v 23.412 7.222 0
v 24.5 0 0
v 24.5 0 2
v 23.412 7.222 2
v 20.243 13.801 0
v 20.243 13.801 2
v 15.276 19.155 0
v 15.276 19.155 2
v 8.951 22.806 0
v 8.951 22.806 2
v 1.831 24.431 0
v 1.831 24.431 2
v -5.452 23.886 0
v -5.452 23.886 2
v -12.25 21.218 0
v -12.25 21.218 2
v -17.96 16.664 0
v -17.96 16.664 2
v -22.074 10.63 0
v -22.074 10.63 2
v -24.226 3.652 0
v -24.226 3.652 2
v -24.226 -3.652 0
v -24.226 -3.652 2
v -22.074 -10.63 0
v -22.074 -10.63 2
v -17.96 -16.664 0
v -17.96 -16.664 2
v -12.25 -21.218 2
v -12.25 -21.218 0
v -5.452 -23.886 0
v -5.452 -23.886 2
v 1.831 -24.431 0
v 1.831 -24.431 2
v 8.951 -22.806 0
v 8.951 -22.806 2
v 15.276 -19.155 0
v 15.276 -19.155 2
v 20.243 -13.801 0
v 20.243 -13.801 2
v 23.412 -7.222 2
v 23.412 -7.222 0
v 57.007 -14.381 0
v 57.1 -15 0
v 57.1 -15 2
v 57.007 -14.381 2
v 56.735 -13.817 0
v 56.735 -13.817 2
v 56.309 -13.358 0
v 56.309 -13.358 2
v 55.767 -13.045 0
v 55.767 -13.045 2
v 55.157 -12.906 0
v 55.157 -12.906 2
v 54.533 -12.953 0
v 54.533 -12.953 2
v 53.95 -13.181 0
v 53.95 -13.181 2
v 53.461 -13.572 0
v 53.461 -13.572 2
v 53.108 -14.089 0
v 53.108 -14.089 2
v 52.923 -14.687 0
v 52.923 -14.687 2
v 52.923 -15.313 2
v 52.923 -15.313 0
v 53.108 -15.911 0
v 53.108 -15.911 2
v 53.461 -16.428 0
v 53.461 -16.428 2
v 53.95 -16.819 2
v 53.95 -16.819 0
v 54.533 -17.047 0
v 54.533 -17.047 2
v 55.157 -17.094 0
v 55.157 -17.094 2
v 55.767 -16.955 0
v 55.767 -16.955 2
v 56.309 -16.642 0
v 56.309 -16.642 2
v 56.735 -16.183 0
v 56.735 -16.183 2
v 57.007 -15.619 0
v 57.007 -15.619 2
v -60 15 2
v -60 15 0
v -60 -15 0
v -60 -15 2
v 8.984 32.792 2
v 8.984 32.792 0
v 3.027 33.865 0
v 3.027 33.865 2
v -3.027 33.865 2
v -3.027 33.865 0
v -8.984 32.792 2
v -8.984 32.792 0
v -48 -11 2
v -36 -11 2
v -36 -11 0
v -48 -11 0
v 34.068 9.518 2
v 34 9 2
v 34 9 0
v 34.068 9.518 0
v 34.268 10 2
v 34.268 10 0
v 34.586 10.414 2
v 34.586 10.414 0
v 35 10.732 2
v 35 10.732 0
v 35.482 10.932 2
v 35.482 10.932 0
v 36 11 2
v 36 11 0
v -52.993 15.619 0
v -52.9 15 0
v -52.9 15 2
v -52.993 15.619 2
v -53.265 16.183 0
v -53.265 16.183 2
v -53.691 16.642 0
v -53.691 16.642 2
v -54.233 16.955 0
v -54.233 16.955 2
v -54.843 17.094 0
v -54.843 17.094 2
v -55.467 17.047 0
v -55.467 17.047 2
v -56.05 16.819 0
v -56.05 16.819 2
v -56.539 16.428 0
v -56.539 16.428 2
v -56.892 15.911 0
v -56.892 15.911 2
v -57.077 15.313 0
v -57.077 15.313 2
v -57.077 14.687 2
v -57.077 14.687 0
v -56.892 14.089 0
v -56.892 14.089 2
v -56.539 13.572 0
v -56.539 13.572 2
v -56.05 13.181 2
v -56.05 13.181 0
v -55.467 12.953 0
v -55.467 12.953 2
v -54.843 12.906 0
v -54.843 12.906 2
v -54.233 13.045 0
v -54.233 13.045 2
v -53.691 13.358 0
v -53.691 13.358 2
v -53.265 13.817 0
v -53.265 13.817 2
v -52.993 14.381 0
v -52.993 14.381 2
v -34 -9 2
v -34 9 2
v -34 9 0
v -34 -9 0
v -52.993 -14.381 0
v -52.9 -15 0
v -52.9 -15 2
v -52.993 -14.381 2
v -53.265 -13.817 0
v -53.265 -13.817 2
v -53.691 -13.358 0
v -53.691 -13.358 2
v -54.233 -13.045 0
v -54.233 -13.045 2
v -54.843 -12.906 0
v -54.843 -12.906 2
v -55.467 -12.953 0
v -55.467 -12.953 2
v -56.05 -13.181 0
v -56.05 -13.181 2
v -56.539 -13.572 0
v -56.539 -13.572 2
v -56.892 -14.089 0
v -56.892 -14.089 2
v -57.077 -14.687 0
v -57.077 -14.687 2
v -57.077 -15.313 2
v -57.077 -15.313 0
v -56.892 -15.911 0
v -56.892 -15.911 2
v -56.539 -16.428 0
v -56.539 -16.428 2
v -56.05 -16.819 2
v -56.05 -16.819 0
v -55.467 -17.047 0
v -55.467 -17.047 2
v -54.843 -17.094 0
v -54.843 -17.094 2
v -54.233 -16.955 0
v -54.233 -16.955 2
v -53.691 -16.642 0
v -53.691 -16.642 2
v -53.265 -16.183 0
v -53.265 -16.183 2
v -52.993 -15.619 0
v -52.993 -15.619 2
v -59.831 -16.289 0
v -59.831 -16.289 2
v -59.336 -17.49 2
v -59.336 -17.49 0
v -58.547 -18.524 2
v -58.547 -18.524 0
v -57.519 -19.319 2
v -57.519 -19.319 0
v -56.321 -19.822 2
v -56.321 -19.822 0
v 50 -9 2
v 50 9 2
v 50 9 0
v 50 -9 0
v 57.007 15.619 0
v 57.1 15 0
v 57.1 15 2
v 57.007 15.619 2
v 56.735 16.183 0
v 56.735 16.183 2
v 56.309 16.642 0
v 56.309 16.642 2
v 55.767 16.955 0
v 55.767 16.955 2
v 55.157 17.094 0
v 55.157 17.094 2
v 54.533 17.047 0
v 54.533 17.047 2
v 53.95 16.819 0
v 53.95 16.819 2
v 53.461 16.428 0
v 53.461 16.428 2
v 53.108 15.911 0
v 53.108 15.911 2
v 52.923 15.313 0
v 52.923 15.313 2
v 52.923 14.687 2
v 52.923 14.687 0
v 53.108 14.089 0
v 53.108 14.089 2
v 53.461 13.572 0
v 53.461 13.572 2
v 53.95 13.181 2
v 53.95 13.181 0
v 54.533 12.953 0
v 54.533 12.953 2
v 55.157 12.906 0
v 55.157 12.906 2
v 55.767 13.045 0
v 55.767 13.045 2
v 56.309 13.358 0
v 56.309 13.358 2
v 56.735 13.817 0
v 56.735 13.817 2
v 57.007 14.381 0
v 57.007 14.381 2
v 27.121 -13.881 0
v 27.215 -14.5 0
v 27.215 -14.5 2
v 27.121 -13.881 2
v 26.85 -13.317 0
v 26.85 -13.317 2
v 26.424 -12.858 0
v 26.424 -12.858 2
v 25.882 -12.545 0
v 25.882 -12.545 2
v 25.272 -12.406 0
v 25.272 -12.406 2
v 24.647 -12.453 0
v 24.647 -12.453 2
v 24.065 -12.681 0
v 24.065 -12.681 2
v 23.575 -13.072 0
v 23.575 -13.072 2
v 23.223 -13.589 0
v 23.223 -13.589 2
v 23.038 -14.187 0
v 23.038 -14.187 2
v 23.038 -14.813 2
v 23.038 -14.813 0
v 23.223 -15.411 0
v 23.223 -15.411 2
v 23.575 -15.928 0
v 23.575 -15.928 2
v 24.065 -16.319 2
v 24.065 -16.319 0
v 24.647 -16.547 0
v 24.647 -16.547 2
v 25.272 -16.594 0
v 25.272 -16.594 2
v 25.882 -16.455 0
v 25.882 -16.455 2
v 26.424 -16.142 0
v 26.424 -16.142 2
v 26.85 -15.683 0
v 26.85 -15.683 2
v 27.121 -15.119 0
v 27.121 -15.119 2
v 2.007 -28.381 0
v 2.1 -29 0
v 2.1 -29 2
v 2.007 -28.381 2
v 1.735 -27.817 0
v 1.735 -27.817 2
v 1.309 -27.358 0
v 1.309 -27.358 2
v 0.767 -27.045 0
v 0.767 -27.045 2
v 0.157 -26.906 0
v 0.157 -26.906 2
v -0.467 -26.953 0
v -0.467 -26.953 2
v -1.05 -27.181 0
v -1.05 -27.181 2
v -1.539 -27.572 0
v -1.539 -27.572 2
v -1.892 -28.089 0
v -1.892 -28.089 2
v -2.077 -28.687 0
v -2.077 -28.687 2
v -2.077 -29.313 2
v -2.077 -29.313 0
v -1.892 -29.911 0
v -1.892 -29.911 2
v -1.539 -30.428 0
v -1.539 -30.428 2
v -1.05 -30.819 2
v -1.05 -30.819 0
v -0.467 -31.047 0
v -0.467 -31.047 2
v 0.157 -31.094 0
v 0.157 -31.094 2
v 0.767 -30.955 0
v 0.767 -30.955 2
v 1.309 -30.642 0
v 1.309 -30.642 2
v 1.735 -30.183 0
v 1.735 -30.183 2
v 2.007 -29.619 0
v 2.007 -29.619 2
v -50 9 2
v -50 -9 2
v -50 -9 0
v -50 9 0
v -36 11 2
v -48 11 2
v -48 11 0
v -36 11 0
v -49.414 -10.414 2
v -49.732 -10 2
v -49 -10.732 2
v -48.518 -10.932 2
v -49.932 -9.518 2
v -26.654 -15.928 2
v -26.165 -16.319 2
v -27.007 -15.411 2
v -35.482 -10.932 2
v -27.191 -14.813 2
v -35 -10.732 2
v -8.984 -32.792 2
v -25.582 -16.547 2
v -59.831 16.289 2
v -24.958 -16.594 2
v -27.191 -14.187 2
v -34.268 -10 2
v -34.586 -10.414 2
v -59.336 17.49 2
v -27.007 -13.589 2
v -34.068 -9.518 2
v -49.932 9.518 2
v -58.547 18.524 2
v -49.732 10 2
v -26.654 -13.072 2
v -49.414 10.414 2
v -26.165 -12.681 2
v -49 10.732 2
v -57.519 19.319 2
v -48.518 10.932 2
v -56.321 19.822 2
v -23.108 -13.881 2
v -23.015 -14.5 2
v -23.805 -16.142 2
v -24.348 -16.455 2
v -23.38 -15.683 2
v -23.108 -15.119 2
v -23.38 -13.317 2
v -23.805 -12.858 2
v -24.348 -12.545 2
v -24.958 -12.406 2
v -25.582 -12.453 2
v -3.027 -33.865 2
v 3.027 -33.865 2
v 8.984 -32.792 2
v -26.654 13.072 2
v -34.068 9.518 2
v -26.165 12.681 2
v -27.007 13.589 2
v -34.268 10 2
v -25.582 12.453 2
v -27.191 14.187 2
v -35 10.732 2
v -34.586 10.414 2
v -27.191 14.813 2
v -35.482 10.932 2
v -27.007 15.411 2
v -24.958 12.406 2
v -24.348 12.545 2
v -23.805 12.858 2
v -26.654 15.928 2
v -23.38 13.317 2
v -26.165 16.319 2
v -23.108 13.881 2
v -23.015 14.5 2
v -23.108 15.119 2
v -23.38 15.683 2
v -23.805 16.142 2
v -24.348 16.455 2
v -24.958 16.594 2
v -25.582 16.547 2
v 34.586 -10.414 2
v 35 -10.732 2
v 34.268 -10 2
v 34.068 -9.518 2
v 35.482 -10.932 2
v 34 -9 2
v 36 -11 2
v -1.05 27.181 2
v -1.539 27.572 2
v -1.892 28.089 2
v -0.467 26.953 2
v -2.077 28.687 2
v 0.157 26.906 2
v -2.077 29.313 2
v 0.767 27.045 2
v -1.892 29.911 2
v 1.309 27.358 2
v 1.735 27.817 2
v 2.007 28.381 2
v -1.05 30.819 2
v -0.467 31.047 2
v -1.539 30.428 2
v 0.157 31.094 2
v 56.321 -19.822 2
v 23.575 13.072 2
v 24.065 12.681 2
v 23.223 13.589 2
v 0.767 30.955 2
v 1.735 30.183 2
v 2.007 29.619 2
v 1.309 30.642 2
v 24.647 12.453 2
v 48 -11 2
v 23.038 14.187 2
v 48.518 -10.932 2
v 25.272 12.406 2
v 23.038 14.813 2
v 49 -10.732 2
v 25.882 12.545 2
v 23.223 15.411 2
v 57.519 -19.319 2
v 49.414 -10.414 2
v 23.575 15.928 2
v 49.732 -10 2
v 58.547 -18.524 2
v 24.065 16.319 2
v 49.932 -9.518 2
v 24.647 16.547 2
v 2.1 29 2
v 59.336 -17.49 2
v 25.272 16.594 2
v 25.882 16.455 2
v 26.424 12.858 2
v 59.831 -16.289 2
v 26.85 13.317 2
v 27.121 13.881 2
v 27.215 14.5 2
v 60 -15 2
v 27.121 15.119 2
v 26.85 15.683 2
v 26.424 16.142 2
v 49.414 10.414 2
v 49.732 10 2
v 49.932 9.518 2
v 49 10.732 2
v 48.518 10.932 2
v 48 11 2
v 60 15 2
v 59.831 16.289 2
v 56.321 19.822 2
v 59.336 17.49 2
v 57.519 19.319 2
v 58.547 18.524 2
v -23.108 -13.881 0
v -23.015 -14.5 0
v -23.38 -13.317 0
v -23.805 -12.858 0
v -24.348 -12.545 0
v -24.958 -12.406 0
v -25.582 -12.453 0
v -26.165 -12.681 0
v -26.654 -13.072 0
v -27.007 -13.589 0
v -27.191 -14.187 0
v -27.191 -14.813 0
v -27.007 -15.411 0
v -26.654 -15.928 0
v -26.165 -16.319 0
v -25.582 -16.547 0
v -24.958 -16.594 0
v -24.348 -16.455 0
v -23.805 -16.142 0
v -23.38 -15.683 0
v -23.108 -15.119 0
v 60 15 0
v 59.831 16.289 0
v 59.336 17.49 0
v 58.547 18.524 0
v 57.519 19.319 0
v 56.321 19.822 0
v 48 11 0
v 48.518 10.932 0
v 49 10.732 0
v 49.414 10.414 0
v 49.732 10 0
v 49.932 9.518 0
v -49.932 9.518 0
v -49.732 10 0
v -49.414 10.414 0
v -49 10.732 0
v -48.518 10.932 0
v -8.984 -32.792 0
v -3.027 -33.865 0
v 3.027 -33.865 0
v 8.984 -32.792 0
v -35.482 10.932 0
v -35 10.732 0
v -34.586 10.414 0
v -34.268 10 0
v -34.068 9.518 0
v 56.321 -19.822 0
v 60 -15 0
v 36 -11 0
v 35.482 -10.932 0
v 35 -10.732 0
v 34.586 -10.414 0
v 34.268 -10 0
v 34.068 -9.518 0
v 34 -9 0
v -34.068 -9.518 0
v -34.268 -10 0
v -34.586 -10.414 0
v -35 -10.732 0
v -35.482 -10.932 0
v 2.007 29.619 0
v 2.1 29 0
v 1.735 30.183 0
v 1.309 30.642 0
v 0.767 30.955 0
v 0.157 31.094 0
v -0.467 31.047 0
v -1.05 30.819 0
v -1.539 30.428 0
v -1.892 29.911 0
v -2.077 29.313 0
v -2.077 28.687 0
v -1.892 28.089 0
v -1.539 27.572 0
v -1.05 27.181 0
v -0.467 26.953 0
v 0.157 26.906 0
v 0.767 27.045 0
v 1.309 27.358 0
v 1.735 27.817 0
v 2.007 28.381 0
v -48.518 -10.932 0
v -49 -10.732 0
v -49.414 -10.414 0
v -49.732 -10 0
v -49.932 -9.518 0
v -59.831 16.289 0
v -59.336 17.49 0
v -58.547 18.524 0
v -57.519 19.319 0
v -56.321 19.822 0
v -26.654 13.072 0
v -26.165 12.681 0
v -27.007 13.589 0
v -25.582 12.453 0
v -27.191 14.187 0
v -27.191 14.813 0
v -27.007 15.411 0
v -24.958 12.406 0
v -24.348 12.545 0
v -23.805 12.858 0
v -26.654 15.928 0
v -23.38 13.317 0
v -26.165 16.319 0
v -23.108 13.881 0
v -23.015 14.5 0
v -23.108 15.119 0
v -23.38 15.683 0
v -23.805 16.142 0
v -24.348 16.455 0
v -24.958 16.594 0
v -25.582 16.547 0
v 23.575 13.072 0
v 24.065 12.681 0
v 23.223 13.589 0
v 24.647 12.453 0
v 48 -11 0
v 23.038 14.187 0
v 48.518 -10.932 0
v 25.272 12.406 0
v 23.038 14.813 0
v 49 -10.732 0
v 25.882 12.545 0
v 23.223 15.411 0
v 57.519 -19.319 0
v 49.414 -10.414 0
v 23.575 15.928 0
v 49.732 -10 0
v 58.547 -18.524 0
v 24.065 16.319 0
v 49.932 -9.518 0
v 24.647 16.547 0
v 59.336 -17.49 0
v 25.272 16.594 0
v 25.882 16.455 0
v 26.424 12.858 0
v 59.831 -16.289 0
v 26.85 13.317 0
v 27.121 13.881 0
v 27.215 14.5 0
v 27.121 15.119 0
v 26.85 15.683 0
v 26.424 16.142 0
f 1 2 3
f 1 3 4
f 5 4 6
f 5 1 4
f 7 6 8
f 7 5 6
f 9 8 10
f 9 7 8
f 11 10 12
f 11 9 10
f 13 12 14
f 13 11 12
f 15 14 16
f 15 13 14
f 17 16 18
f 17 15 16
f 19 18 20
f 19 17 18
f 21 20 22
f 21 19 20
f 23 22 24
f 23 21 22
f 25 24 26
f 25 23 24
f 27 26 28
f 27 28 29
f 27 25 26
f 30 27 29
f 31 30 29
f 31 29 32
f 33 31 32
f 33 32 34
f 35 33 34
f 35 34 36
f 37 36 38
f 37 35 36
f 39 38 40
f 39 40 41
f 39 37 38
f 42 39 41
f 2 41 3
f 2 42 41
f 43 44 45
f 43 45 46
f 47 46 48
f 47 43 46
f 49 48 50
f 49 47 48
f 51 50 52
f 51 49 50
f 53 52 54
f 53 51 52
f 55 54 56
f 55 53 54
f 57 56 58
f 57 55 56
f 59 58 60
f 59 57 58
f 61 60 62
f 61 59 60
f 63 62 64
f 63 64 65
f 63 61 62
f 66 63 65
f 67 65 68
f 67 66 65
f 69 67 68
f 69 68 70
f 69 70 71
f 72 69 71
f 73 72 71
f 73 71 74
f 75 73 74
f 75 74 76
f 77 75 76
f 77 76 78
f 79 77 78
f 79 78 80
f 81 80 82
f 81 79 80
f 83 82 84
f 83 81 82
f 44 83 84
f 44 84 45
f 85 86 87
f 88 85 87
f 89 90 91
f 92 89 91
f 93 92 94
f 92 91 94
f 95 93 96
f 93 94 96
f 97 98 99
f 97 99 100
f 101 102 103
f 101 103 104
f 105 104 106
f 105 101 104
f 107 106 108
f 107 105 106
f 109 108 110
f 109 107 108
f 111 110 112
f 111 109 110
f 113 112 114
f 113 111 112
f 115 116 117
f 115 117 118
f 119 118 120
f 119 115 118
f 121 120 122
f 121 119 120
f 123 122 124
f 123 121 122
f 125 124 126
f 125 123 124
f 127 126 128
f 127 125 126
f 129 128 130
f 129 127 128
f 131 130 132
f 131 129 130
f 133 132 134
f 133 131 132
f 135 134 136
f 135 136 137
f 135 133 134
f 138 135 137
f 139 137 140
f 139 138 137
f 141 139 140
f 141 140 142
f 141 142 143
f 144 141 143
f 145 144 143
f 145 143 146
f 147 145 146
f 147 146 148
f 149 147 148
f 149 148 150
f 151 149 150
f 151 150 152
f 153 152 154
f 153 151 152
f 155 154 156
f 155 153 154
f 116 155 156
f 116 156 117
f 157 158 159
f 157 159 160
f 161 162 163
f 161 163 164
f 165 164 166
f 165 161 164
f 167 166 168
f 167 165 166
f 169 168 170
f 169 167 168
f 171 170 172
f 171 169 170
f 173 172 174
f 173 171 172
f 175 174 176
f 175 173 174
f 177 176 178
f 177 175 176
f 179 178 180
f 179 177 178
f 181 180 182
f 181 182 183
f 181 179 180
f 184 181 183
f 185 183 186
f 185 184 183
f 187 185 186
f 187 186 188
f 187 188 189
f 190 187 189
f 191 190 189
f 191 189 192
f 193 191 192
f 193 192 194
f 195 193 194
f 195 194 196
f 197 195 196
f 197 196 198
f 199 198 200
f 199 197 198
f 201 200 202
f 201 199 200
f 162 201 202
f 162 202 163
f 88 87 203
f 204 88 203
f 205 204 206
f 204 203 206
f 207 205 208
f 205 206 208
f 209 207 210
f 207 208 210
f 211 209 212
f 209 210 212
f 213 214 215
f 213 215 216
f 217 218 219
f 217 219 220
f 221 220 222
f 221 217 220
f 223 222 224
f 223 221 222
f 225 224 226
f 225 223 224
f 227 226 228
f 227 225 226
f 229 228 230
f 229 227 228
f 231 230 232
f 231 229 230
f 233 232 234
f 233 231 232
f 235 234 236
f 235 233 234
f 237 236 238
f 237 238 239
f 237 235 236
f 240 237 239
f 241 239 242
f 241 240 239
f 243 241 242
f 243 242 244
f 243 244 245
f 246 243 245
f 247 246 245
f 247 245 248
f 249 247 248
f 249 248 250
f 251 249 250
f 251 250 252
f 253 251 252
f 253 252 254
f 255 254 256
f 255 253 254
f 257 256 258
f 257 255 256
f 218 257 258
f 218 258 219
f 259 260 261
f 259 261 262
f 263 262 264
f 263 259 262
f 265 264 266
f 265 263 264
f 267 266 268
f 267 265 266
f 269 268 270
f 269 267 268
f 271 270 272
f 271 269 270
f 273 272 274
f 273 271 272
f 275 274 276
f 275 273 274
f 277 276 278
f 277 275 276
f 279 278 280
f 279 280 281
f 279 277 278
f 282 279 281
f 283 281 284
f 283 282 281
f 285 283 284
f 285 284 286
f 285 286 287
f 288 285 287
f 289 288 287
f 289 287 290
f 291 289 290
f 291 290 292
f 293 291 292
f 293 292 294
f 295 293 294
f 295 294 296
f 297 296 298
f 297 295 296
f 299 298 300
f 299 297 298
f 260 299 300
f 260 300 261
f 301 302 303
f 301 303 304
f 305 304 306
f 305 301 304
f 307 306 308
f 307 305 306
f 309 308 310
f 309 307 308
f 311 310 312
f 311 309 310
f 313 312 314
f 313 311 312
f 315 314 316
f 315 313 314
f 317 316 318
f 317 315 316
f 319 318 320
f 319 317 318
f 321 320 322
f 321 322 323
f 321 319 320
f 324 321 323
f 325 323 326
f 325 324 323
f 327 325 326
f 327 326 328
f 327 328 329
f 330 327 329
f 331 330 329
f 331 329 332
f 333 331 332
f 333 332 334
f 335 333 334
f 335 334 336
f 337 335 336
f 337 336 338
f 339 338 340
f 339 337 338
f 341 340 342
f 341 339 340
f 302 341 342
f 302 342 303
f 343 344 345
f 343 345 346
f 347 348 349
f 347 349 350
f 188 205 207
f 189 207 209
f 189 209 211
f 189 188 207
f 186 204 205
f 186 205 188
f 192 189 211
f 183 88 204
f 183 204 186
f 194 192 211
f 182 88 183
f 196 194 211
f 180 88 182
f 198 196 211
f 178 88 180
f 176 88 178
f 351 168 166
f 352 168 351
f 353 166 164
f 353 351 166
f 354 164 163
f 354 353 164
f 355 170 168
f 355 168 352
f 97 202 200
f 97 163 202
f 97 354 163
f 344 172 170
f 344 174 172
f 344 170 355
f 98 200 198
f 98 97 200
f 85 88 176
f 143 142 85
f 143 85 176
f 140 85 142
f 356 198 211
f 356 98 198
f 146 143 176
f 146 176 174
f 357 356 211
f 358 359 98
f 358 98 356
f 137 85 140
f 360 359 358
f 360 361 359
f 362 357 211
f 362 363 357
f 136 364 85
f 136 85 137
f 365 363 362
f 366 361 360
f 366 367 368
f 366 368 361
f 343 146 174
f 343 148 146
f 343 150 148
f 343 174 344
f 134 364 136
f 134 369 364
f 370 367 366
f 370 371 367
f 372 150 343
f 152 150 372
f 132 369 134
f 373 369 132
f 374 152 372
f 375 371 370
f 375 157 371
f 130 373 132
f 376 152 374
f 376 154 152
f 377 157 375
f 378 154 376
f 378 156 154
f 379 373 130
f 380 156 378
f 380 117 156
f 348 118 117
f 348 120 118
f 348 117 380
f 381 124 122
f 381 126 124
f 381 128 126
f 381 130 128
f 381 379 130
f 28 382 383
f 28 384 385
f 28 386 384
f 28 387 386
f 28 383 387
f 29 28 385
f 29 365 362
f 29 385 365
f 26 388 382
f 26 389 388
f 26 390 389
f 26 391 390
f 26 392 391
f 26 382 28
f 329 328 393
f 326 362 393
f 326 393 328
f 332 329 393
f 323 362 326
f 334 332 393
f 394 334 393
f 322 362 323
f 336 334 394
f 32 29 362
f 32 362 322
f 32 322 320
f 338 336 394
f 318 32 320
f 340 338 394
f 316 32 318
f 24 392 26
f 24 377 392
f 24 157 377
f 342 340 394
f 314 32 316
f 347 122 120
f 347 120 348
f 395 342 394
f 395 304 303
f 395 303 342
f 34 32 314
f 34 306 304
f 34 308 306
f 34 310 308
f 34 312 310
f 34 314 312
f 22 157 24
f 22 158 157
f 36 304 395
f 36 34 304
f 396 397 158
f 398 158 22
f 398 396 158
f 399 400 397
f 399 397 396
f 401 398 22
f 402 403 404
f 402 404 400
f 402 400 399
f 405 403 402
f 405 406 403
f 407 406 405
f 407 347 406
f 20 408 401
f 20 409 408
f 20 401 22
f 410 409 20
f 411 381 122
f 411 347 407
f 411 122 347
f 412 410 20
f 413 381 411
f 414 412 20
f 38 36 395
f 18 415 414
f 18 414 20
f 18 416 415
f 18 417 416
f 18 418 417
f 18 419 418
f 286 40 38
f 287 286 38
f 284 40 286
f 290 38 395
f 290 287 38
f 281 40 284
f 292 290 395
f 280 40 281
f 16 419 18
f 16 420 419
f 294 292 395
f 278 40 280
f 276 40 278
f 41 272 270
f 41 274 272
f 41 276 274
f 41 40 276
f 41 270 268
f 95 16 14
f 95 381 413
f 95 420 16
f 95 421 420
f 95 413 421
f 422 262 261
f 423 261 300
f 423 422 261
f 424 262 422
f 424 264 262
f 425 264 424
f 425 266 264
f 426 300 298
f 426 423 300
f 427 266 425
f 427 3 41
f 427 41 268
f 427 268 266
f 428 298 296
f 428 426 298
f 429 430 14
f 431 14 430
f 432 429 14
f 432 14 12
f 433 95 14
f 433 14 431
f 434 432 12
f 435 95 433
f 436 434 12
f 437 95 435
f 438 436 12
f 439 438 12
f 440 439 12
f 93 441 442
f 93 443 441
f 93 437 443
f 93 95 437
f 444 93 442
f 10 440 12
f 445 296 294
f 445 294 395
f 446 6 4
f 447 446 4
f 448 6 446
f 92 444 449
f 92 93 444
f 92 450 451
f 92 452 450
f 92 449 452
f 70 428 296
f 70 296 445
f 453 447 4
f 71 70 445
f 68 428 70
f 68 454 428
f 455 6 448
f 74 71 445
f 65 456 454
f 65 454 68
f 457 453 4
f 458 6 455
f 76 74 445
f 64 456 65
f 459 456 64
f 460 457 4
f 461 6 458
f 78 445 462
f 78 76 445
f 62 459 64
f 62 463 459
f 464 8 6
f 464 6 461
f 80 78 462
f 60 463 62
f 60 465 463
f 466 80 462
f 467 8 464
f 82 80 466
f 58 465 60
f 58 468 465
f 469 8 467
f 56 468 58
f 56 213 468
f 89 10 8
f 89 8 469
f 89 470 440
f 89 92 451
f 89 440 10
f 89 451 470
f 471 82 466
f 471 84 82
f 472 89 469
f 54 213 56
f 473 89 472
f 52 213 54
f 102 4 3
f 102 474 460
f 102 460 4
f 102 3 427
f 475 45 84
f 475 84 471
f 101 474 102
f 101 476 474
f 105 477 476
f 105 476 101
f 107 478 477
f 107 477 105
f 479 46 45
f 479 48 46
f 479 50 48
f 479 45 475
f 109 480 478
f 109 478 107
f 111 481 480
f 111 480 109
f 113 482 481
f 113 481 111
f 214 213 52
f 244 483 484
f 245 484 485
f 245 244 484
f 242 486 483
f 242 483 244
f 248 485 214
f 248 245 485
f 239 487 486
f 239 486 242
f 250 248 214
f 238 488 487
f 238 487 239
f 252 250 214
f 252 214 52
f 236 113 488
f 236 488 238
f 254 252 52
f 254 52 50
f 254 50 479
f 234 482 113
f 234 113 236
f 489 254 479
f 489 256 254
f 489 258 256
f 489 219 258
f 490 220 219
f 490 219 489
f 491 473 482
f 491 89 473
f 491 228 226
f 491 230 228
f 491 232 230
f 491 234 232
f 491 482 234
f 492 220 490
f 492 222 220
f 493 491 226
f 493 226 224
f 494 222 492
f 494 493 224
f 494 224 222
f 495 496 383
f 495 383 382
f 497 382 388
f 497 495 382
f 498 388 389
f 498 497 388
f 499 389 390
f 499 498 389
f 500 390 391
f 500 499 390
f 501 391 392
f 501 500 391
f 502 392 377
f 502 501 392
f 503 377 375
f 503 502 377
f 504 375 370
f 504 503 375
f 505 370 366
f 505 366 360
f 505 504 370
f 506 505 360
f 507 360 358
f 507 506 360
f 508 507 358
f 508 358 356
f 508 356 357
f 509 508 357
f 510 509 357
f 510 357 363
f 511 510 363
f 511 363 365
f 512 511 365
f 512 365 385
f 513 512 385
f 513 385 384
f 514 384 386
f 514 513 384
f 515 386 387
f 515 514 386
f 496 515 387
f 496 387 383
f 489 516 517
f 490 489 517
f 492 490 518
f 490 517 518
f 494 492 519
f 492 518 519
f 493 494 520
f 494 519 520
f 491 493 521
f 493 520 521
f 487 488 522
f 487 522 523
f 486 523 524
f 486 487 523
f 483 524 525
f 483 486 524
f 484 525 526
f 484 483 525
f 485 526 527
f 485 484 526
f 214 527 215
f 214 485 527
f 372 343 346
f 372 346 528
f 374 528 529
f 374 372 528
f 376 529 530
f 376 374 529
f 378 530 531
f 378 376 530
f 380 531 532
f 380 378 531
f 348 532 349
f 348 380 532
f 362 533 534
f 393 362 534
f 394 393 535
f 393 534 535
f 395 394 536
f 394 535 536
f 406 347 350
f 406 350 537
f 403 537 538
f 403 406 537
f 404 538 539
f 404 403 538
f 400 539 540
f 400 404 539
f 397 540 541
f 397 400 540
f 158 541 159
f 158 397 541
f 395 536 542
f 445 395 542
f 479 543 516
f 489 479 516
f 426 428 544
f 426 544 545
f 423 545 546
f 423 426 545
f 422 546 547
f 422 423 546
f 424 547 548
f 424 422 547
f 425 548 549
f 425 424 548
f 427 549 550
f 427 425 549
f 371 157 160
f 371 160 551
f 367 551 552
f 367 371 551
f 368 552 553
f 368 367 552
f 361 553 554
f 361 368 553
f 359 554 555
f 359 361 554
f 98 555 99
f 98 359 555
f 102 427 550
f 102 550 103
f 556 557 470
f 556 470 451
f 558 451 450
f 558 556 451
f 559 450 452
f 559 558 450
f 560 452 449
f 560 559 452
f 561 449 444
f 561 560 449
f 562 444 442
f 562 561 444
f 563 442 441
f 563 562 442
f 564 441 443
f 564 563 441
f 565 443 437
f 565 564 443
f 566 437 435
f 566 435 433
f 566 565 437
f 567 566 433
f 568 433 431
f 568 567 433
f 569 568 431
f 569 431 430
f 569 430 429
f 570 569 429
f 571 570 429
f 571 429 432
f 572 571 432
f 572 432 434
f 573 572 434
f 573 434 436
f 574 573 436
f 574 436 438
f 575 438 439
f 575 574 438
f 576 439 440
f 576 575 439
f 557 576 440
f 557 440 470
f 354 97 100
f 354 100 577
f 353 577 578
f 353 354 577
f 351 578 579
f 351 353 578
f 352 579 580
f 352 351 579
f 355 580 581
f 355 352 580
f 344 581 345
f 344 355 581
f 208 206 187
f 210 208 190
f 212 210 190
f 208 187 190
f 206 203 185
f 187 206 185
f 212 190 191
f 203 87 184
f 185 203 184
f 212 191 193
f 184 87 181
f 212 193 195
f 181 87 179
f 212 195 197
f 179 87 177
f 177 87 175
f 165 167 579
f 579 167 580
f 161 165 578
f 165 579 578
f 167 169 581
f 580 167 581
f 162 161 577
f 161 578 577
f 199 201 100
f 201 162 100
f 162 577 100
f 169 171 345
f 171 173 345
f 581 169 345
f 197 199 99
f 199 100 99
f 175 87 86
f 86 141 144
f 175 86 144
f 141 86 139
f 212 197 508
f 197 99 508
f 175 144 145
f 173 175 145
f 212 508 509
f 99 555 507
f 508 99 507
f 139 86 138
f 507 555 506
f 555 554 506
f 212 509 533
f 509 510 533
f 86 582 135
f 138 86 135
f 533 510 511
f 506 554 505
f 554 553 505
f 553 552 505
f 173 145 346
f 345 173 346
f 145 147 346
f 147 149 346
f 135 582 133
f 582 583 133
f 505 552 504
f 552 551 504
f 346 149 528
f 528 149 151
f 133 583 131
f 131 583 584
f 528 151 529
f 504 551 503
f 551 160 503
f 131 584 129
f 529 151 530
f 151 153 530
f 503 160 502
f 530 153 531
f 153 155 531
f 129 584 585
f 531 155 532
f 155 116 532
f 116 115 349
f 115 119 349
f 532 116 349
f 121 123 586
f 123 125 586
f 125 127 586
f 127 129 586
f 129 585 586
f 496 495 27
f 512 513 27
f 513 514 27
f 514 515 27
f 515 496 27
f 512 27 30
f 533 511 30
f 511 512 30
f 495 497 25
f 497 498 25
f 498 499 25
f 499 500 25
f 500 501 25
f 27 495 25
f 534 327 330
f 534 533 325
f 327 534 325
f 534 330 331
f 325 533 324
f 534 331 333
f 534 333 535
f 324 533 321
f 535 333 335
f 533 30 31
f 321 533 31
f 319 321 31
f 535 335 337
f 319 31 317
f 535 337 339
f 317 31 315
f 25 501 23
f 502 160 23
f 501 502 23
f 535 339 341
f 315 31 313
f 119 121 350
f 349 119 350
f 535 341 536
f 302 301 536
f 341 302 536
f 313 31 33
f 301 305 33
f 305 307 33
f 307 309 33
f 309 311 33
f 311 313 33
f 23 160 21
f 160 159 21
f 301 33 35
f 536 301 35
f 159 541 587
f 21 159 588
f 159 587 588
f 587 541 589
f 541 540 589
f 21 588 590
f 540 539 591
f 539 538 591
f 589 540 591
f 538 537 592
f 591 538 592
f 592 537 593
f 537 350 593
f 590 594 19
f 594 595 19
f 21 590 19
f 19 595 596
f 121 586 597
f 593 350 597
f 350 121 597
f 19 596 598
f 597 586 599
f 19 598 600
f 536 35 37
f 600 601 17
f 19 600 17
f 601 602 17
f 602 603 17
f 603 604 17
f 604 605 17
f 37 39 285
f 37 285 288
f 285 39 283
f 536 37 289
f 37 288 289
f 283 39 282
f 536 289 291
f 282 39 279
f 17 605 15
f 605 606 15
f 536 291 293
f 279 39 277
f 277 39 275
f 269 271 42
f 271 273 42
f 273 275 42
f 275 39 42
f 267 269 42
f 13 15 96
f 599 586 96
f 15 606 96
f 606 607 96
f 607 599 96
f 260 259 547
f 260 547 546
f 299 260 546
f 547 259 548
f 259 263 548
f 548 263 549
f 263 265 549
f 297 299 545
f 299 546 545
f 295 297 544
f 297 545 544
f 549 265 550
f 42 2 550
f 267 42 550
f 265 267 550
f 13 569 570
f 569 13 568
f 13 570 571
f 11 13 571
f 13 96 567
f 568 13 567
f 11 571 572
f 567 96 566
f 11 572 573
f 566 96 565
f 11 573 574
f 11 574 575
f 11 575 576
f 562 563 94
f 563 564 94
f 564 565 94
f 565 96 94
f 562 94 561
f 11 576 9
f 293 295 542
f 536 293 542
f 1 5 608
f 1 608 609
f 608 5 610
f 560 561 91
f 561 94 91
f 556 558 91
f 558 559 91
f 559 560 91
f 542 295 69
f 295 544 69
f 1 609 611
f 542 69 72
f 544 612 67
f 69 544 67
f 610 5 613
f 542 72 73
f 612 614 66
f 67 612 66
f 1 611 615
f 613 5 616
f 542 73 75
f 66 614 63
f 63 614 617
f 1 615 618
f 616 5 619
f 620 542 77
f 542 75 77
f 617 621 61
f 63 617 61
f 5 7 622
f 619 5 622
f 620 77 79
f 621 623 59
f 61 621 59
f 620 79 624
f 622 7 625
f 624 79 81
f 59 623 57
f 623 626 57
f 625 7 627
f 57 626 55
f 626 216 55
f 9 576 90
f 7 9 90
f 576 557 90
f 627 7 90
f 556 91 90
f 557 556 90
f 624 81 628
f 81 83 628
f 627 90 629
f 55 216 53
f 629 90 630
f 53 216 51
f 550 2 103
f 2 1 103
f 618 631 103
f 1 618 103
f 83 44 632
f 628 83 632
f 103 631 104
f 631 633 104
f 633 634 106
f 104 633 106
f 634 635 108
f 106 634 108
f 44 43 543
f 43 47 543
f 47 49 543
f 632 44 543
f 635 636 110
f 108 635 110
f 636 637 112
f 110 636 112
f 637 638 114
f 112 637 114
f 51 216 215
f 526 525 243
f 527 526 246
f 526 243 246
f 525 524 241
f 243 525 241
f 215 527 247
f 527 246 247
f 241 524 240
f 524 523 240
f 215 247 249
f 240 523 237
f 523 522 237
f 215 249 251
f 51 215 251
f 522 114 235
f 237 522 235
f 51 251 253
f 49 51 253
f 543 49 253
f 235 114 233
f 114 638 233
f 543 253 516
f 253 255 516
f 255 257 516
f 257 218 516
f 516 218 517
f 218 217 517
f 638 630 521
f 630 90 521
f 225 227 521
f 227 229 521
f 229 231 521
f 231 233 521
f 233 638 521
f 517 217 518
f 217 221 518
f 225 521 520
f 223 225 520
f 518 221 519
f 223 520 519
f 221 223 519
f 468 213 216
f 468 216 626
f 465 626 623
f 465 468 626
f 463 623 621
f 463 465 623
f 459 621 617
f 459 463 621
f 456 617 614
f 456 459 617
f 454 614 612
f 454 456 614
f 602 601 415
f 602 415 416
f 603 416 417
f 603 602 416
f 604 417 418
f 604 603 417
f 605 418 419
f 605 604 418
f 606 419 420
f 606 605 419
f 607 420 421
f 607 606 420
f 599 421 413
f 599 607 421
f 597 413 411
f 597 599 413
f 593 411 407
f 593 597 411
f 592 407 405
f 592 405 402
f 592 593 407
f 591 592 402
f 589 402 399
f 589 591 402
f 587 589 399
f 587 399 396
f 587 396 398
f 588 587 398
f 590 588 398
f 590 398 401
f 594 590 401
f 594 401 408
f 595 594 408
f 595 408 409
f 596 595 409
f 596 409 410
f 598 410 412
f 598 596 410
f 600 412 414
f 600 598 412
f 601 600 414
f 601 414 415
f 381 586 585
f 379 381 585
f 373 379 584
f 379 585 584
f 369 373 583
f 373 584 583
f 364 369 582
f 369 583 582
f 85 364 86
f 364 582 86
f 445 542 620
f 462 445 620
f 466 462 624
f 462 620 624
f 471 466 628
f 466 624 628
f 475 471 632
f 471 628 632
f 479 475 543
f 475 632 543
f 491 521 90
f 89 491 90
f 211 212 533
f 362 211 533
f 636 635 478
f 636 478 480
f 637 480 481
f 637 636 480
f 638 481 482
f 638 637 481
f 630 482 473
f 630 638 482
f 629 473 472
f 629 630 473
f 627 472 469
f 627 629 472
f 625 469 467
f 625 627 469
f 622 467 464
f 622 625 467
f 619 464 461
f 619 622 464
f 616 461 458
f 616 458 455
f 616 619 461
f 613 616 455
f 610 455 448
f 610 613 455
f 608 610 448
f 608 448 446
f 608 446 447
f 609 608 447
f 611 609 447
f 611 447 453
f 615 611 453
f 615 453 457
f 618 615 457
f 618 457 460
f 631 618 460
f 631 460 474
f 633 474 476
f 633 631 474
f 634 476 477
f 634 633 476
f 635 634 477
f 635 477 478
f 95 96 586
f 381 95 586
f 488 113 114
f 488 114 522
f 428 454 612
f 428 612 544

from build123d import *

# Parameters (mm, degrees)
SKETCH_1_R          = 24.5
SKETCH_1_R_2        = 2.1
EXTRUDE_1_DEPTH     = 2
CUT_EXTRUDE_1_DEPTH = 10


with BuildPart() as part:
    # 草图1 → 凸台-拉伸1 (new body)
    with BuildSketch(Plane.XY):
        with BuildLine():
            Line((-60, 15), (-60, -15))
            ThreePointArc((-60, -15), (-58.975297052, -18.032657803), (-56.321194659, -19.82228625))
            Line((-56.321194659, -19.82228625), (-8.984123683, -32.791546497))
            ThreePointArc((-8.984123683, -32.791546497), (0, -34), (8.984123683, -32.791546497))
            Line((8.984123683, -32.791546497), (56.321194659, -19.82228625))
            ThreePointArc((56.321194659, -19.82228625), (58.975297052, -18.032657803), (60, -15))
            Line((60, -15), (60, 15))
            ThreePointArc((60, 15), (58.975297052, 18.032657803), (56.321194659, 19.82228625))
            Line((56.321194659, 19.82228625), (8.984123683, 32.791546497))
            ThreePointArc((8.984123683, 32.791546497), (0, 34), (-8.984123683, 32.791546497))
            Line((-8.984123683, 32.791546497), (-56.321194659, 19.82228625))
            ThreePointArc((-56.321194659, 19.82228625), (-58.975297052, 18.032657803), (-60, 15))
        make_face()
        Circle(SKETCH_1_R, mode=Mode.SUBTRACT)
        with Locations((0, 29)):
            Circle(SKETCH_1_R_2, mode=Mode.SUBTRACT)
        with Locations((25.11473671, 14.5)):
            Circle(SKETCH_1_R_2, mode=Mode.SUBTRACT)
        with Locations((25.11473671, -14.5)):
            Circle(SKETCH_1_R_2, mode=Mode.SUBTRACT)
        with Locations((0, -29)):
            Circle(SKETCH_1_R_2, mode=Mode.SUBTRACT)
        with Locations((-25.11473671, -14.5)):
            Circle(SKETCH_1_R_2, mode=Mode.SUBTRACT)
        with Locations((-25.11473671, 14.5)):
            Circle(SKETCH_1_R_2, mode=Mode.SUBTRACT)
        with Locations((-55, 15)):
            Circle(SKETCH_1_R_2, mode=Mode.SUBTRACT)
        with Locations((-55, -15)):
            Circle(SKETCH_1_R_2, mode=Mode.SUBTRACT)
        with Locations((55, -15)):
            Circle(SKETCH_1_R_2, mode=Mode.SUBTRACT)
        with Locations((55, 15)):
            Circle(SKETCH_1_R_2, mode=Mode.SUBTRACT)
    extrude(amount=EXTRUDE_1_DEPTH)

    # 草图2 → 切除-拉伸1 (cut)
    with BuildSketch(Plane.XY.offset(2)):
        with BuildLine():
            Line((-48, 11), (-36, 11))
            ThreePointArc((-36, 11), (-34.585786438, 10.414213562), (-34, 9))
            Line((-34, 9), (-34, -9))
            ThreePointArc((-34, -9), (-34.585786438, -10.414213562), (-36, -11))
            Line((-36, -11), (-48, -11))
            ThreePointArc((-48, -11), (-49.414213562, -10.414213562), (-50, -9))
            Line((-50, -9), (-50, 9))
            ThreePointArc((-50, 9), (-49.414213562, 10.414213562), (-48, 11))
        make_face()
        with BuildLine():
            Line((36, 11), (48, 11))
            ThreePointArc((48, 11), (49.414213562, 10.414213562), (50, 9))
            Line((50, 9), (50, -9))
            ThreePointArc((50, -9), (49.414213562, -10.414213562), (48, -11))
            Line((48, -11), (36, -11))
            ThreePointArc((36, -11), (34.585786438, -10.414213562), (34, -9))
            Line((34, -9), (34, 9))
            ThreePointArc((34, 9), (34.585786438, 10.414213562), (36, 11))
        make_face()
    extrude(amount=-CUT_EXTRUDE_1_DEPTH, mode=Mode.SUBTRACT)


solid = part.part
